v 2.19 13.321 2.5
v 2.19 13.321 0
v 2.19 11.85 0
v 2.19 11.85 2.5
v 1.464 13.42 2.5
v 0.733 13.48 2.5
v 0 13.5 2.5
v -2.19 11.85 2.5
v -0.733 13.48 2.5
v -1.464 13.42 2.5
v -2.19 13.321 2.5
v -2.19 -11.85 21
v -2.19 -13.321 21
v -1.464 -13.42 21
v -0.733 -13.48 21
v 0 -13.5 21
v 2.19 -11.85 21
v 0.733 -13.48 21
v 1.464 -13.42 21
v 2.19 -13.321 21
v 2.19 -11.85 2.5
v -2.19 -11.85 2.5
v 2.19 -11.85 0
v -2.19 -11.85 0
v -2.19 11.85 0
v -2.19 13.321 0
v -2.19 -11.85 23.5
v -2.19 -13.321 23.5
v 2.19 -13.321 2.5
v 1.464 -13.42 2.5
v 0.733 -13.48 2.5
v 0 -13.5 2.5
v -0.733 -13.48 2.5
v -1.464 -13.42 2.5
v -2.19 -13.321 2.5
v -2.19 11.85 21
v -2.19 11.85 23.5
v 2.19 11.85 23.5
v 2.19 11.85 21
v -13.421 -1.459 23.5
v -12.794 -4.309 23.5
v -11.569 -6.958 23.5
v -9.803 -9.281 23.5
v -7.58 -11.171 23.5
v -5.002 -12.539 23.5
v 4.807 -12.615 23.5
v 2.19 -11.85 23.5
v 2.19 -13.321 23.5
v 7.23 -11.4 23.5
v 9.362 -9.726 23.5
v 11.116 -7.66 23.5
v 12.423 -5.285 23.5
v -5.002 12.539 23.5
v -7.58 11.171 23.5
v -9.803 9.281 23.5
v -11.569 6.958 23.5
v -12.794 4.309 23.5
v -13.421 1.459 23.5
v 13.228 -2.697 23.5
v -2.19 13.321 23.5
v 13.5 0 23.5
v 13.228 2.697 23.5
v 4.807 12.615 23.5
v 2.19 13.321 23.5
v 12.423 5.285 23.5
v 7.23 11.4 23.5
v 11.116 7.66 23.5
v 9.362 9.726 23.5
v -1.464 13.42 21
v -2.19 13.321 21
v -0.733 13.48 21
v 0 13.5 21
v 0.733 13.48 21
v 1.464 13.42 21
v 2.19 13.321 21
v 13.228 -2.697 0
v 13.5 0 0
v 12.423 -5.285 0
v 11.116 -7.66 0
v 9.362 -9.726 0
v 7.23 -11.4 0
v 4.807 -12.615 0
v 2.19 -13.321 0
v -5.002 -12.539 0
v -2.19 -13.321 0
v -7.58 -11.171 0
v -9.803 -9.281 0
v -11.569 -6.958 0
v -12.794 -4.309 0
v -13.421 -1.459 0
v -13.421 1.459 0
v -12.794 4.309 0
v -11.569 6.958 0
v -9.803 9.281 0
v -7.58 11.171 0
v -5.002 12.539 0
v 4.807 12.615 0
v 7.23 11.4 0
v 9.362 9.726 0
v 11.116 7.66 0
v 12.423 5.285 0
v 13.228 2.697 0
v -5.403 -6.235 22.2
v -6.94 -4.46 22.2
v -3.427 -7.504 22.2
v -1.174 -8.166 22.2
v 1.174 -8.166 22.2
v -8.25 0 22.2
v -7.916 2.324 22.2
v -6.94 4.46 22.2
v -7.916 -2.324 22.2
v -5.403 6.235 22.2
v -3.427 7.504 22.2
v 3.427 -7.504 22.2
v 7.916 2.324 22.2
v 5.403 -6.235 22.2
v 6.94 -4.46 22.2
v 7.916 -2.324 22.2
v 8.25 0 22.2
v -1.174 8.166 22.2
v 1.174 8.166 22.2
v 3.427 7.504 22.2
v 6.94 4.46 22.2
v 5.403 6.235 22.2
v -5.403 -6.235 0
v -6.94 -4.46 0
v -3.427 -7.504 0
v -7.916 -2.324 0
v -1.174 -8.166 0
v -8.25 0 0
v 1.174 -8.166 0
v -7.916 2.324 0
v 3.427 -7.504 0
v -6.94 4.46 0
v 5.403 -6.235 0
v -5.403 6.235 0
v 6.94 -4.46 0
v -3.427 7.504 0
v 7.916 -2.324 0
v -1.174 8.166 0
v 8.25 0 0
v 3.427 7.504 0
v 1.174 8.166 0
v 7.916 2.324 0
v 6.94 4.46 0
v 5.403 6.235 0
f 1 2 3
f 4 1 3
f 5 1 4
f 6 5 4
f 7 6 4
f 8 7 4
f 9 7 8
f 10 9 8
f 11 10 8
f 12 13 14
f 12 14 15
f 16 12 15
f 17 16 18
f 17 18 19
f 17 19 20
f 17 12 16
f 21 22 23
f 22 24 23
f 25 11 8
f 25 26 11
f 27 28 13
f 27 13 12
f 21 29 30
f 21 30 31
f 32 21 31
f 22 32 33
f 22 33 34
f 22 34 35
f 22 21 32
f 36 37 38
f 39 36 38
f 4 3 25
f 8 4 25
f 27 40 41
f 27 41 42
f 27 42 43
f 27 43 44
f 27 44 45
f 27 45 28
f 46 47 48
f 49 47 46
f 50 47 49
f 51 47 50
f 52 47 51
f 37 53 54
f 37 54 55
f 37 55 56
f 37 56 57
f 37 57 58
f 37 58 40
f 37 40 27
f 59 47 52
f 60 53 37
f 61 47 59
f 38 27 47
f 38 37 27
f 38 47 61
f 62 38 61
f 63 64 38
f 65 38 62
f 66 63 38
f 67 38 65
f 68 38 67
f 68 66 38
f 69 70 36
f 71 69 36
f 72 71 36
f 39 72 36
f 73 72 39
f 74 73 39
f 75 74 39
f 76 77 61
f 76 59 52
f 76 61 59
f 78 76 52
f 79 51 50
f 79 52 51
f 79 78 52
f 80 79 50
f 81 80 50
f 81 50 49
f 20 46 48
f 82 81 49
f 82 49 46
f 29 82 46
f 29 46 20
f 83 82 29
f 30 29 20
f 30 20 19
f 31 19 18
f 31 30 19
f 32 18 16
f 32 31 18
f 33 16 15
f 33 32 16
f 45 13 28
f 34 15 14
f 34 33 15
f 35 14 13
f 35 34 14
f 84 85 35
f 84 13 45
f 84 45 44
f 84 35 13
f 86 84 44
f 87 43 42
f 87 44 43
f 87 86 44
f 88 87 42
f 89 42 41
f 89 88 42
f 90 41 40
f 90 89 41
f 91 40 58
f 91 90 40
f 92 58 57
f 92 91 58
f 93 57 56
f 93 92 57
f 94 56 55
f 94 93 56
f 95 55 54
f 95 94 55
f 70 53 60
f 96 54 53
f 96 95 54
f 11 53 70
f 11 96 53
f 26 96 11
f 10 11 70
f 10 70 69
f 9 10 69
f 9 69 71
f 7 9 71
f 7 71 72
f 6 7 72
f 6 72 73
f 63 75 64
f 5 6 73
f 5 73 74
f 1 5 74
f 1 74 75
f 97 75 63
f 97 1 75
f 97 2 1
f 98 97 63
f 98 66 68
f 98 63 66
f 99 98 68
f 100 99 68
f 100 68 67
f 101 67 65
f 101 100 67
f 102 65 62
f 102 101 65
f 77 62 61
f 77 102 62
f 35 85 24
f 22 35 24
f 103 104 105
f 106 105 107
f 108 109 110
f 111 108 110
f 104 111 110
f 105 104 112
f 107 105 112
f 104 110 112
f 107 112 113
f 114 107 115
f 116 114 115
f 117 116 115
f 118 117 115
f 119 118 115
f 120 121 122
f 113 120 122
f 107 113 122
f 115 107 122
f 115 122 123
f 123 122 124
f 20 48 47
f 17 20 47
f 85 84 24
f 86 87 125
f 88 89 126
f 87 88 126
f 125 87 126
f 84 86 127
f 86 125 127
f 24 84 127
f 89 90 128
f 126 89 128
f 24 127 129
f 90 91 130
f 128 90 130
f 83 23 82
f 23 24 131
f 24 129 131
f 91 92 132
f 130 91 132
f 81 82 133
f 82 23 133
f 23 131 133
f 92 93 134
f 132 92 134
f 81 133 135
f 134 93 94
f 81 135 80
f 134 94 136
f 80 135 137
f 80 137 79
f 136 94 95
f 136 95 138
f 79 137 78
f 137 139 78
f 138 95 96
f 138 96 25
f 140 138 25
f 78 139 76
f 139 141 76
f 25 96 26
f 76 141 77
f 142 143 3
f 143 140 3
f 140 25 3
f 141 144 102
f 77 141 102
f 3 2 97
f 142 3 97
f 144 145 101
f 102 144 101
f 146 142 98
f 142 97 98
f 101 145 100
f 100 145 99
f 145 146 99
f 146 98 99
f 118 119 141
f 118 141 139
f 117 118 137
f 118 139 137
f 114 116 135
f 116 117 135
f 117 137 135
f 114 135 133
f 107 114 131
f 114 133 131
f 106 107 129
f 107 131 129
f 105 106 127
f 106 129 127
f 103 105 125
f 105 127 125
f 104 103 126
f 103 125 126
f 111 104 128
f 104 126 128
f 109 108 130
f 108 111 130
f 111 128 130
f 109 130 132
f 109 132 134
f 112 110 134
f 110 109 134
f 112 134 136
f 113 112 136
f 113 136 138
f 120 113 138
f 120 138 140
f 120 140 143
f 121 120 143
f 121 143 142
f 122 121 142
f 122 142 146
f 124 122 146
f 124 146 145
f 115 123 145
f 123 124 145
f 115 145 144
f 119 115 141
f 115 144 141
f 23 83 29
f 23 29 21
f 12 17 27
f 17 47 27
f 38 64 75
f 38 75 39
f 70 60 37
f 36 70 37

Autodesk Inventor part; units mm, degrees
ref_plane "YZ Plane" through (0, 0, 0) normal (1, 0, 0) x (0, 1, 0)
ref_plane "XZ Plane" through (0, 0, 0) normal (0, 1, 0) x (-1, 0, 0)
ref_plane "XY Plane" through (0, 0, 0) normal (0, 0, 1) x (1, 0, 0)
sketch "Esquisse1" plane through (0, 0, 0) normal (0, 0, 1) x (1, 0, 0)
  circle A0 centre (0, 0) radius 13.5
  circle A1 centre (0, 0) radius 8.25
  dimension "d0" = 27
  dimension "d1" = 16.5
extrude "Extrusion1" add sketch "Esquisse1" along normal blind 23.5
sketch "Esquisse2" plane through (0, 0, 23.5) normal (0, 0, 1) x (1, 0, 0)
  circle A0 centre (0, 0) radius 8.25
extrude "Extrusion2" add sketch "Esquisse2" against normal blind 1.3
sketch "Esquisse3" plane through (0, 0, 0) normal (0, 0, -1) x (-1, 0, 0)
  line L0 (-2.1903, 13.3211) -> (-2.1903, 11.85)
  line L1 (-2.1903, 11.85) -> (0, 11.85)
  line L2 (0, 11.85) -> (2.1903, 11.85)
  line L3 (2.1903, 13.3211) -> (2.1903, 11.85)
  arc A0 (0, 13.5) -> (-2.1903, 13.3211) centre (0, 0) ccw
  arc A1 (2.1903, 13.3211) -> (0, 13.5) centre (0, 0) ccw
  arc A2 (0, -13.5) -> (2.1903, -13.3211) centre (0, 0) ccw
  arc A3 (-2.1903, -13.3211) -> (0, -13.5) centre (0, 0) ccw
  line L4 (-2.1903, -13.3211) -> (-2.1903, -11.85)
  line L5 (0, -11.85) -> (-2.1903, -11.85)
  line L6 (2.1903, -11.85) -> (0, -11.85)
  line L7 (2.1903, -13.3211) -> (2.1903, -11.85)
  point P0 (0, 0)
  point P1 (0, -50)
  point P2 (-13.5, 0)
extrude "Extrusion3" cut sketch "Esquisse3" against normal blind 2.5
sketch "Esquisse4" plane through (0, 0, 23.5) normal (0, 0, 1) x (1, 0, 0)
  line L0 (-2.1903, 13.3211) -> (-2.1903, 11.85)
  line L1 (-2.1903, 11.85) -> (0, 11.85)
  line L2 (0, 11.85) -> (2.1903, 11.85)
  line L3 (2.1903, 13.3211) -> (2.1903, 11.85)
  arc A0 (0, 13.5) -> (-2.1903, 13.3211) centre (0, 0) ccw
  arc A1 (2.1903, 13.3211) -> (0, 13.5) centre (0, 0) ccw
  arc A2 (0, -13.5) -> (2.1903, -13.3211) centre (0, 0) ccw
  arc A3 (-2.1903, -13.3211) -> (0, -13.5) centre (0, 0) ccw
  line L4 (-2.1903, -13.3211) -> (-2.1903, -11.85)
  line L5 (0, -11.85) -> (-2.1903, -11.85)
  line L6 (2.1903, -11.85) -> (0, -11.85)
  line L7 (2.1903, -13.3211) -> (2.1903, -11.85)
  point P0 (0, 0)
  point P1 (0, 0)
extrude "Extrusion4" cut sketch "Esquisse4" against normal blind 2.5
properties part number "pièce intermédiaire"
